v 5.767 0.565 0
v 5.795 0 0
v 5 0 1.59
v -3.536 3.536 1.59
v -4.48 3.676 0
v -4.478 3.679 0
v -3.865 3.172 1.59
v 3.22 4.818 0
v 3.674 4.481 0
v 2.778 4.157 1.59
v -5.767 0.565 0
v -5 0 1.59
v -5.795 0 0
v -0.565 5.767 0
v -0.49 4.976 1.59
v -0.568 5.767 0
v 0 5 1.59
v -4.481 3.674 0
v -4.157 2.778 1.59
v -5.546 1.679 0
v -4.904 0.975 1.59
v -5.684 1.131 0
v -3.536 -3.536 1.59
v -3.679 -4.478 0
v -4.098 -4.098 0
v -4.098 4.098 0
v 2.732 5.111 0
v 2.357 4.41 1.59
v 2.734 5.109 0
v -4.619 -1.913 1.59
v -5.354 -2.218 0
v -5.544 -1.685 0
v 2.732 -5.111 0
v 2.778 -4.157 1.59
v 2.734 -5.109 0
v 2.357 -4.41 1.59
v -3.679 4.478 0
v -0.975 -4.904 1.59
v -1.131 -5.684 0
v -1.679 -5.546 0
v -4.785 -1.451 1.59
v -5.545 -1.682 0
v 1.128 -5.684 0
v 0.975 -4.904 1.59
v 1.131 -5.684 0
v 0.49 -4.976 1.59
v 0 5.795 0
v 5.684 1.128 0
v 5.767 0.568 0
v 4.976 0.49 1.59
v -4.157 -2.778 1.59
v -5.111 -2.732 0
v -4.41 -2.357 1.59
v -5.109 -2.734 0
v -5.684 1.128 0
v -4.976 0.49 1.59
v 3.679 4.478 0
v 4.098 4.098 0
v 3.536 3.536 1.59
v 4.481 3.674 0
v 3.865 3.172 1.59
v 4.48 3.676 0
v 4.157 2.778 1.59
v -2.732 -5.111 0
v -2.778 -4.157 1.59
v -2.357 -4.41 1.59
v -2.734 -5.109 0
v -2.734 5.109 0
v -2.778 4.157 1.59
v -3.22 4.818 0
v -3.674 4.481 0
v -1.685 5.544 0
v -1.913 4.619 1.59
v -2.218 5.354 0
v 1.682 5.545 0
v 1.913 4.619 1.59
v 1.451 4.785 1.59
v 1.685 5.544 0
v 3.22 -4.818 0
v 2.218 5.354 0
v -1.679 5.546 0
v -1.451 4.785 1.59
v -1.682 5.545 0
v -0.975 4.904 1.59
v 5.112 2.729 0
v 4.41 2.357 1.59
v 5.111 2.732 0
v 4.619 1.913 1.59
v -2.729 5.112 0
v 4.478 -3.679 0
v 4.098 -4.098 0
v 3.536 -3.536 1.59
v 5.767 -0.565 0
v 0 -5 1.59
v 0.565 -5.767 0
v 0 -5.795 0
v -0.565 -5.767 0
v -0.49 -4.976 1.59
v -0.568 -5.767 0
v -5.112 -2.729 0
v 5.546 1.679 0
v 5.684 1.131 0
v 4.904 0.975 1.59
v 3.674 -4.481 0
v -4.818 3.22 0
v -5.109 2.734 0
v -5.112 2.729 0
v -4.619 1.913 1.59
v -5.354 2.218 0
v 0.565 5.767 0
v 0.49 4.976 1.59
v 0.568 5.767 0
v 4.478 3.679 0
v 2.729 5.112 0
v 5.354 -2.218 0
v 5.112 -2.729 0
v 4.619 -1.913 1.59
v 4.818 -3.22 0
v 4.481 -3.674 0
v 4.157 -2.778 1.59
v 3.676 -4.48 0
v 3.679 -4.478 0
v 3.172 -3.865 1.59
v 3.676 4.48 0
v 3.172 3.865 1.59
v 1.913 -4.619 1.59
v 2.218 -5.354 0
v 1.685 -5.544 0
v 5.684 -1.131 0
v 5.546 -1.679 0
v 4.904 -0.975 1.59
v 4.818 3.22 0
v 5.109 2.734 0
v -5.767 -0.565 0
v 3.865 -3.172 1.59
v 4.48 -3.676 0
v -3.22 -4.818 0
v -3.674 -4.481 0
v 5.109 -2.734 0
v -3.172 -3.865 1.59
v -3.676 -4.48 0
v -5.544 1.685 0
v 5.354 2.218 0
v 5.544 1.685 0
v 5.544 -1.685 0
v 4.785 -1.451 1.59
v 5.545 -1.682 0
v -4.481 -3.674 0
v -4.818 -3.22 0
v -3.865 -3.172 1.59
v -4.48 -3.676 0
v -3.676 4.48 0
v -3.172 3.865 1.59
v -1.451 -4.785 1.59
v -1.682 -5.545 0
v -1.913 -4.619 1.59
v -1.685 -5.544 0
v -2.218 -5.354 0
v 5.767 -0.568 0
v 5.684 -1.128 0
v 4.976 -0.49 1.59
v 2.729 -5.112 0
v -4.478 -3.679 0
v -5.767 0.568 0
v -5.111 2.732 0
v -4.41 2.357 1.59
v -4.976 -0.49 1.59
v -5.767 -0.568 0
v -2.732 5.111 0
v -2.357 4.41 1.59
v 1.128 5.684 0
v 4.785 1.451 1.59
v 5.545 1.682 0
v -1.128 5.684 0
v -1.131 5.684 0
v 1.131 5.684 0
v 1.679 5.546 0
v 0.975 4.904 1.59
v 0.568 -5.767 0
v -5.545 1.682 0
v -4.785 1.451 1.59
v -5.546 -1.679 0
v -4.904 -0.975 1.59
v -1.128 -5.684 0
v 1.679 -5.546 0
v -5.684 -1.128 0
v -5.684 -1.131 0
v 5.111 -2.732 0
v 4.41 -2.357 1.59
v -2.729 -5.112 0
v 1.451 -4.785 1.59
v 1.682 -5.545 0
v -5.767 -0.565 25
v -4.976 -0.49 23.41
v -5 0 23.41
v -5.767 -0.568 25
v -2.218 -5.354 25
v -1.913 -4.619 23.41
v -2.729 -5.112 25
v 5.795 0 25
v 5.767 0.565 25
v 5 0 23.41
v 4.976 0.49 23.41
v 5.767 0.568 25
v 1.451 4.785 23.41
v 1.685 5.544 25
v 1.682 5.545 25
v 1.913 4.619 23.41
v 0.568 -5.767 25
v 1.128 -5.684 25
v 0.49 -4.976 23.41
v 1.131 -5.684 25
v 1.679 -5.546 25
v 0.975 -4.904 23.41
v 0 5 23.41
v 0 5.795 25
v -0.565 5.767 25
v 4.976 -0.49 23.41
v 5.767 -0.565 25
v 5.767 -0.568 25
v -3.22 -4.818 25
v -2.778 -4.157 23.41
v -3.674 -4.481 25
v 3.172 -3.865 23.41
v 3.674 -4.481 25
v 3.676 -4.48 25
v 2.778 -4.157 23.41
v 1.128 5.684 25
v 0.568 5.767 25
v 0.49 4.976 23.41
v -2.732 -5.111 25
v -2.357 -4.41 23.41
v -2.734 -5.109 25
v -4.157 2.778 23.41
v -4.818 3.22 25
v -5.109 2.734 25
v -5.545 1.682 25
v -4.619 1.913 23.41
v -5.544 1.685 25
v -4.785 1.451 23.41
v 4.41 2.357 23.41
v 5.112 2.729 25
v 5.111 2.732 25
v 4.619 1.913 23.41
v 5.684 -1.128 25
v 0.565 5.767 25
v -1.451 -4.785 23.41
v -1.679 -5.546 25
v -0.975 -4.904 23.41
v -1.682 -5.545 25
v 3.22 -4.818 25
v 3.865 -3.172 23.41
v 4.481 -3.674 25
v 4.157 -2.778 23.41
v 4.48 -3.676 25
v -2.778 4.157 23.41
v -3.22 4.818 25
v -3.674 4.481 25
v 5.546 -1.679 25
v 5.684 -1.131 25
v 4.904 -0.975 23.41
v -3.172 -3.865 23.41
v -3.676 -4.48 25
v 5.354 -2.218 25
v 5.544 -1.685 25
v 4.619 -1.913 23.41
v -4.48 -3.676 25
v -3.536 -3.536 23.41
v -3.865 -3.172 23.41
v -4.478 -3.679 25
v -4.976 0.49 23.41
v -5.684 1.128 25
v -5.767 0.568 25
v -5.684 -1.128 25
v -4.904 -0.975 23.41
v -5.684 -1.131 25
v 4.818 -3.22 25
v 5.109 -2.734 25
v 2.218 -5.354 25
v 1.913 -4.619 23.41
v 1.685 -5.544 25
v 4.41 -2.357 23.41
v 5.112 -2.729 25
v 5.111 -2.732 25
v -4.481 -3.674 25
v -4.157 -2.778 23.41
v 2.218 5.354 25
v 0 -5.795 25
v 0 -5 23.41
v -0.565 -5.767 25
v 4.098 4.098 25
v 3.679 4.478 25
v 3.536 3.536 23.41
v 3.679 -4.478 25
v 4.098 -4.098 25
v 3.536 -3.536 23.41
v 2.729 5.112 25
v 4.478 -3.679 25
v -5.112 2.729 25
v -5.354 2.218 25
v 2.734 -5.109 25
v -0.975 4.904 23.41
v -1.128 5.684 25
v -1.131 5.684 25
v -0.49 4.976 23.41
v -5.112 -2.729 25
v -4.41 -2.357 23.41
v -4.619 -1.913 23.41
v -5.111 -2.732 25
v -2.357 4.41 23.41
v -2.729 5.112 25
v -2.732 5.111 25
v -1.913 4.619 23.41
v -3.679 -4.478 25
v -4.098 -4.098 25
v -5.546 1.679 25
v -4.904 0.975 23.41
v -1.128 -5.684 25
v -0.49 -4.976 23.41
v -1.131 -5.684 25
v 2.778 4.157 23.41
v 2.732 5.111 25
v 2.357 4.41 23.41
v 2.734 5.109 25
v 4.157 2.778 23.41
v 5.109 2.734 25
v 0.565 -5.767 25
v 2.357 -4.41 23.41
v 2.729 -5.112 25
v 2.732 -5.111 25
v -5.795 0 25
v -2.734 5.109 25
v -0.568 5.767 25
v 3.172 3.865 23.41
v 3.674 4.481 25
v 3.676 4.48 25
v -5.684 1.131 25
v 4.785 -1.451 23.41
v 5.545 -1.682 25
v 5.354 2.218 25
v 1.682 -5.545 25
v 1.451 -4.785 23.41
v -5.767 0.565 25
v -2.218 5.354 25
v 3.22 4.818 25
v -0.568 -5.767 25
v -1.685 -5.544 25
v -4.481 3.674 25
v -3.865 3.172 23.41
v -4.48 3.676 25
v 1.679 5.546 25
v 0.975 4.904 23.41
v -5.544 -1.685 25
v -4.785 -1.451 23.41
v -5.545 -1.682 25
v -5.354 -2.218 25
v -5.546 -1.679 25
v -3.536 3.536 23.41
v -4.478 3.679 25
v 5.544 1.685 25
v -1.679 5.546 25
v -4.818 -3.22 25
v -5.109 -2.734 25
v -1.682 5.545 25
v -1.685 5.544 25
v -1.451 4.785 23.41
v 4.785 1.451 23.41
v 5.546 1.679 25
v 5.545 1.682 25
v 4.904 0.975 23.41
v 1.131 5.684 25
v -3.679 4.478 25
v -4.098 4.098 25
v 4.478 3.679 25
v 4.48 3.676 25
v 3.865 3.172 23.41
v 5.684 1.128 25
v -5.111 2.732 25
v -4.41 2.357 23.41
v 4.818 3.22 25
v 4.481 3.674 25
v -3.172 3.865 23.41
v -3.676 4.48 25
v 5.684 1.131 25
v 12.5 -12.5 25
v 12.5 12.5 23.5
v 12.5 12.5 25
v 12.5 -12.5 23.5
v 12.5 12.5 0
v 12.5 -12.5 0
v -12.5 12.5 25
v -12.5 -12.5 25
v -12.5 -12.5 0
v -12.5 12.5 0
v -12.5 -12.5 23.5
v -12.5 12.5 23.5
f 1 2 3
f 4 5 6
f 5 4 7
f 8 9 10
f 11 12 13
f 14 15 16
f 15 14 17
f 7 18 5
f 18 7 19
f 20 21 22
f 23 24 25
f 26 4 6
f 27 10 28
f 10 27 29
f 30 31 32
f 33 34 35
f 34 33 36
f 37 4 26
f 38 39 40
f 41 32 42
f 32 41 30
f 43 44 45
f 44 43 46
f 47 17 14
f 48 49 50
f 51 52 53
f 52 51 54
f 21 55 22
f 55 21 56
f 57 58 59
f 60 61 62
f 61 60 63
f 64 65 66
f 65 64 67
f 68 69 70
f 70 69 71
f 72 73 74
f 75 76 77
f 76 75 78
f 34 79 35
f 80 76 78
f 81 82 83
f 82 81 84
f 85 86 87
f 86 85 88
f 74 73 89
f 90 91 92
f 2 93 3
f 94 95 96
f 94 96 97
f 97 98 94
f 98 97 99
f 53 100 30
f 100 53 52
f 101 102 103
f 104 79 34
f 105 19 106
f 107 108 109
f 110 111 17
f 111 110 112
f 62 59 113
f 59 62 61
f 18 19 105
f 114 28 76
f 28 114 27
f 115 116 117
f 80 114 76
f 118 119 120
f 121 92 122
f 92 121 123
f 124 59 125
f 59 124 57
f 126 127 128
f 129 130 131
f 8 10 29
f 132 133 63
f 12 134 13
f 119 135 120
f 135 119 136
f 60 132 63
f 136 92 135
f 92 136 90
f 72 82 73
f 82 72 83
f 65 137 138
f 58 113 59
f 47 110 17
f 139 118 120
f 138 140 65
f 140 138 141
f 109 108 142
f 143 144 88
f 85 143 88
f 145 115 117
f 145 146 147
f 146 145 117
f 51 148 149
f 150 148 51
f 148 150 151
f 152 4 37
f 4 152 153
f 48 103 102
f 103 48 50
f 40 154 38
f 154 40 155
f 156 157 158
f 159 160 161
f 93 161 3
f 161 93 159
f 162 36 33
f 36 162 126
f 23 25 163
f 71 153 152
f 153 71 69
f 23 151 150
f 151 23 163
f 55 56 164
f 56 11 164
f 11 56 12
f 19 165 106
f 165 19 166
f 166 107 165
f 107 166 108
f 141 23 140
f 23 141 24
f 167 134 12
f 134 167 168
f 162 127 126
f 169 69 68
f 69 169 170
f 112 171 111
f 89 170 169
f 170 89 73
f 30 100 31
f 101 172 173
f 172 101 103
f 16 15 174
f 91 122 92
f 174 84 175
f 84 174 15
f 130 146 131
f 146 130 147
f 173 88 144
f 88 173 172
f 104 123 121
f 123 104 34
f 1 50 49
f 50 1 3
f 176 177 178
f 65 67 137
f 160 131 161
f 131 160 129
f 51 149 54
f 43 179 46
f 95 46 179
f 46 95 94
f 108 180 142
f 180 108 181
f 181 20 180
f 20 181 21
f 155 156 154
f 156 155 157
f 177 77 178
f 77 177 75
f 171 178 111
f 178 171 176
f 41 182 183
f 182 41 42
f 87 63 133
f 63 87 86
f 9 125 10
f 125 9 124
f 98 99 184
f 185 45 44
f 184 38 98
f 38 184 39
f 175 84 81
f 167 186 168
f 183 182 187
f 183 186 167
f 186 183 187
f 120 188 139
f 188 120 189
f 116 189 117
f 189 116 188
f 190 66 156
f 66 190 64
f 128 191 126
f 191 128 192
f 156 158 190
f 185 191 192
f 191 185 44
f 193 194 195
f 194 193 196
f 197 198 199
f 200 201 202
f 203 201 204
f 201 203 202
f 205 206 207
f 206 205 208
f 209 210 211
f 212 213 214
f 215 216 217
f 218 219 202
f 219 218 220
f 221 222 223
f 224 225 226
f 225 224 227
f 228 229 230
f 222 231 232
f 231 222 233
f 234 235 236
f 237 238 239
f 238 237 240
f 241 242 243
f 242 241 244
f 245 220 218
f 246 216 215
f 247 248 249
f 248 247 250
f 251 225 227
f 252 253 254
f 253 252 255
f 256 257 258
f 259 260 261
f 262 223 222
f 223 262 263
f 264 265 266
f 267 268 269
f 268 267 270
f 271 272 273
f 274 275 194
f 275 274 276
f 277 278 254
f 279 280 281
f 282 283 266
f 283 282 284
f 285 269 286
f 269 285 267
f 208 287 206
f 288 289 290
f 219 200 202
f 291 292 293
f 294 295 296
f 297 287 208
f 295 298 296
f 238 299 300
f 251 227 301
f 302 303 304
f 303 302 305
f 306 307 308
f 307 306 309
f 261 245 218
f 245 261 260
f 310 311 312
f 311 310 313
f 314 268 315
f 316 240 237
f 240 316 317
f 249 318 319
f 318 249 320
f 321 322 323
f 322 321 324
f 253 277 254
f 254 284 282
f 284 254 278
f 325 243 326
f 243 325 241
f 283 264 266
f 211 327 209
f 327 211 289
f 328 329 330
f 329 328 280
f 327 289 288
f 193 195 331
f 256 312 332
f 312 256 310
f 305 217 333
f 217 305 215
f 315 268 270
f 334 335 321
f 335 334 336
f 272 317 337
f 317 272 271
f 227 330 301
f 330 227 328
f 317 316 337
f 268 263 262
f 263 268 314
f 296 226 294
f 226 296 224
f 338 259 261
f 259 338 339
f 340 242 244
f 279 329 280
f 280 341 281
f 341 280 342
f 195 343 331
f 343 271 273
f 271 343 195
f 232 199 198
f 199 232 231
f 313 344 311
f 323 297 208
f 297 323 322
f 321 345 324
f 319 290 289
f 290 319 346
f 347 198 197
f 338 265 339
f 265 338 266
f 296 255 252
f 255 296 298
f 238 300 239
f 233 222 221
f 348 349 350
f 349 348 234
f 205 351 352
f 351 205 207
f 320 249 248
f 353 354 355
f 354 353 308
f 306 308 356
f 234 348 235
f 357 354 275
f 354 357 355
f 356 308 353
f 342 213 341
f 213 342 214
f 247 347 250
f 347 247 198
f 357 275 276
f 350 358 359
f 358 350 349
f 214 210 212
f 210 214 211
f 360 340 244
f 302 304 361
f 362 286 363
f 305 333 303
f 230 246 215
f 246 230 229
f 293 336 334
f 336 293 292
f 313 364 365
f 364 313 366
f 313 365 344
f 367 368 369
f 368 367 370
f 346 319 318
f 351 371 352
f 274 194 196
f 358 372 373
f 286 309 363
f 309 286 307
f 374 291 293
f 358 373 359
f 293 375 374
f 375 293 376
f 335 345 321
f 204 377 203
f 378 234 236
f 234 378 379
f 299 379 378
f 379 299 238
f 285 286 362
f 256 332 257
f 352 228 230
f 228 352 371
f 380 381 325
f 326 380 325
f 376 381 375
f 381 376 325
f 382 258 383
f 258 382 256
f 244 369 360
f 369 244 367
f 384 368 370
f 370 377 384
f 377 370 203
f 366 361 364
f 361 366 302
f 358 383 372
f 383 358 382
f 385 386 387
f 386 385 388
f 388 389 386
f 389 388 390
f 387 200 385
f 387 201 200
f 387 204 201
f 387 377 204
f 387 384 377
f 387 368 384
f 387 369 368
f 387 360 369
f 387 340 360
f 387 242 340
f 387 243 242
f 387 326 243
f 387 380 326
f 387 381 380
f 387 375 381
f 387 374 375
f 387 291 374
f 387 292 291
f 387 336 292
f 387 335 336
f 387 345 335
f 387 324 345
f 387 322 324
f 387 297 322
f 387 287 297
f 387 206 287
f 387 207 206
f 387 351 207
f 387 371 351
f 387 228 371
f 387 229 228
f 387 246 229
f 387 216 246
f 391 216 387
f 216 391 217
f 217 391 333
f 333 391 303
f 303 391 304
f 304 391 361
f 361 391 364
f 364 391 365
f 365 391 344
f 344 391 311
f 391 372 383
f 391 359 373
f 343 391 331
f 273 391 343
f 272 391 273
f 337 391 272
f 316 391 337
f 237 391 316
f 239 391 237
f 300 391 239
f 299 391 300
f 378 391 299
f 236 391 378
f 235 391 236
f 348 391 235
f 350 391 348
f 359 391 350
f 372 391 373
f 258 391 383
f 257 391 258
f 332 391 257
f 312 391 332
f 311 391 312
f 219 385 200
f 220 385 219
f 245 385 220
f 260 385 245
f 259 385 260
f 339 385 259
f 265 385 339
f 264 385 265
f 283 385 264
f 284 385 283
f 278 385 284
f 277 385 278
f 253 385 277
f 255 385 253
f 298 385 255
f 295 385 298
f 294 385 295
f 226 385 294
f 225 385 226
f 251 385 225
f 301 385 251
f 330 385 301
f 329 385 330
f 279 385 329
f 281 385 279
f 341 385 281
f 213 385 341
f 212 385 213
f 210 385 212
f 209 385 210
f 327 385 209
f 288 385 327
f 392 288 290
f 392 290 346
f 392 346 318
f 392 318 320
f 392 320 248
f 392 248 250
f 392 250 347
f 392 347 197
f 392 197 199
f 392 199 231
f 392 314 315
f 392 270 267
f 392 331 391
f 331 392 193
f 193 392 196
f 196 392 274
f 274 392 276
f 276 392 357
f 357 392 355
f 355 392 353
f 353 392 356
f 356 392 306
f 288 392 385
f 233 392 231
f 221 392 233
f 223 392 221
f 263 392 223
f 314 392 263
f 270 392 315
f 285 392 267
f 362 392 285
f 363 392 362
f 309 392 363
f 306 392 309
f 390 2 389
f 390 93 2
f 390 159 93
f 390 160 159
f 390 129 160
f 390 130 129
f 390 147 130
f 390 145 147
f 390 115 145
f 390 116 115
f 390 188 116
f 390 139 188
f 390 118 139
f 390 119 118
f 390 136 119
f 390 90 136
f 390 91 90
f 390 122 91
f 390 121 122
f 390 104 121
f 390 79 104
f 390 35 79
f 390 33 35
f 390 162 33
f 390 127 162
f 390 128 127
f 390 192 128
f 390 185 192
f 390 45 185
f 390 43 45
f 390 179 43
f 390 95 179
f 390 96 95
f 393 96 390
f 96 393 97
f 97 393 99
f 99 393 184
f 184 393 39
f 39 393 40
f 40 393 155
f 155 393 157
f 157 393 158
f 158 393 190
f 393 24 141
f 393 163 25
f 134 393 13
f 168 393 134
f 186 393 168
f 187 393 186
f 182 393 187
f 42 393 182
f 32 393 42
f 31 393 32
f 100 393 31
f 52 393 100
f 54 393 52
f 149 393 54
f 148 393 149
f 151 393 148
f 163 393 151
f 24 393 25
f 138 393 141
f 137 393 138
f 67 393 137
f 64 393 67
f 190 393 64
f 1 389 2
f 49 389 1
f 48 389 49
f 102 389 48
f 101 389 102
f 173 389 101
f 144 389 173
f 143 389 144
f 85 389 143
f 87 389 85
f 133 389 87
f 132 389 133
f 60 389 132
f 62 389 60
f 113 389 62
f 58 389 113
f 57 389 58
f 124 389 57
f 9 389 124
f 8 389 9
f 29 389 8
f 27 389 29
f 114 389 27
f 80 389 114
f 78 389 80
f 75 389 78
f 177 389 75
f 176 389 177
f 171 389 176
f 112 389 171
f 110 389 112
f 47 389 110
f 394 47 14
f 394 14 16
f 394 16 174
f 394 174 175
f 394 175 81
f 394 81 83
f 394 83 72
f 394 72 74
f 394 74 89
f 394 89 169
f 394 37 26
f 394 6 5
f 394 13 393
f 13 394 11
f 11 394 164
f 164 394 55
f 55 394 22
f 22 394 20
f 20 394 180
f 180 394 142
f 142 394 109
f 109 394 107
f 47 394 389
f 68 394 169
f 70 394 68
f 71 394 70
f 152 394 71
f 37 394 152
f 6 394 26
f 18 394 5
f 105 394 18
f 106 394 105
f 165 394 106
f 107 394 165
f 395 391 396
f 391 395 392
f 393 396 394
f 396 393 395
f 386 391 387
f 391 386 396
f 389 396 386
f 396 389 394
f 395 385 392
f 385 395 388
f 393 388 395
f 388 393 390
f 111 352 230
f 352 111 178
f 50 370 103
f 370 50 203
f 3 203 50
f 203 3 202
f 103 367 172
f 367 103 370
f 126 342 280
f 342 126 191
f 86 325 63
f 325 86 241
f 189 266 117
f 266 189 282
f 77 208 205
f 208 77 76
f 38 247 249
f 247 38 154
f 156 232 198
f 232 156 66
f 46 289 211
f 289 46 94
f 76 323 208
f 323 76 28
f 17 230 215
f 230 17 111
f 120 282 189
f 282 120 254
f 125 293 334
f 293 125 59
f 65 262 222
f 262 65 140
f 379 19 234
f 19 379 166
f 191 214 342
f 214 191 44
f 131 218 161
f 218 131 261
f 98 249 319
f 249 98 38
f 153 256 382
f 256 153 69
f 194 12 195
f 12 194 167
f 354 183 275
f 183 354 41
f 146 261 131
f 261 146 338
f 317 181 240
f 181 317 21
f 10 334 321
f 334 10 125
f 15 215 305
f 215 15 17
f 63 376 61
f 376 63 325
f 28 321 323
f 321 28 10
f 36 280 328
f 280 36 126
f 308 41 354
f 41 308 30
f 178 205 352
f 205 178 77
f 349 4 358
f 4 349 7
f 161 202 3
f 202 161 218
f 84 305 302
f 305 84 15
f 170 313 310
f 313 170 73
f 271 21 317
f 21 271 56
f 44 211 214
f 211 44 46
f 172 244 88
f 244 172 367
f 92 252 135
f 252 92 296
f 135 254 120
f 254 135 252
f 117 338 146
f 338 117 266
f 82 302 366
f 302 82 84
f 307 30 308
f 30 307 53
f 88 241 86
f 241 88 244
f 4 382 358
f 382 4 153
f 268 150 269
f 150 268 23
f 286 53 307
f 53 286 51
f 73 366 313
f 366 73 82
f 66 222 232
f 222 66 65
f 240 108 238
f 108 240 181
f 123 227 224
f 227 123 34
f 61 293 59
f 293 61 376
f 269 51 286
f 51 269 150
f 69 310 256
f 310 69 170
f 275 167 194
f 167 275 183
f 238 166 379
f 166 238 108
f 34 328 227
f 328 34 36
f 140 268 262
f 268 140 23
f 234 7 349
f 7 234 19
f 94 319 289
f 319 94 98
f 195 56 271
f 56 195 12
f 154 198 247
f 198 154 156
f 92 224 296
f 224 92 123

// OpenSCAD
/* [Dimensions] */
// Cube side length
cube_size = 25; // [10:50]
// Through-hole diameter
hole_diameter = 10; // [2:0.5:20]
// Top edge chamfer size
top_chamfer = 2; // [0:0.5:5]

/* [Options] */
// Add chamfer to hole entry/exit
chamfer_hole = true;

// Derived values
hole_r = hole_diameter / 2;
chamfer_size = chamfer_hole ? 0.8 : 0;

$fn = 64;

difference() {
    // Main cube with top edge chamfer, centered then shifted to sit on XY plane
    translate([0, 0, cube_size / 2])
        cube([cube_size, cube_size, cube_size], center = true);
    
    // Top edge chamfer cuts (four edges)
    for (a = [0:90:270]) {
        rotate([0, 0, a])
            translate([cube_size / 2 + top_chamfer, 0, cube_size - top_chamfer + 0.5])
                rotate([0, 45, 0])
                    cube([top_chamfer * sqrt(2), cube_size + 1, top_chamfer * sqrt(2)], center = true);
    }
    
    // Through-hole along Z axis
    translate([0, 0, -0.5])
        cylinder(h = cube_size + 1, r = hole_r);
    
    // Chamfers at top and bottom of hole
    if (chamfer_hole) {
        translate([0, 0, -0.01])
            cylinder(h = chamfer_size * 2, r1 = hole_r + chamfer_size, r2 = hole_r);
        translate([0, 0, cube_size - chamfer_size * 2 + 0.01])
            cylinder(h = chamfer_size * 2, r1 = hole_r, r2 = hole_r + chamfer_size);
    }
}
